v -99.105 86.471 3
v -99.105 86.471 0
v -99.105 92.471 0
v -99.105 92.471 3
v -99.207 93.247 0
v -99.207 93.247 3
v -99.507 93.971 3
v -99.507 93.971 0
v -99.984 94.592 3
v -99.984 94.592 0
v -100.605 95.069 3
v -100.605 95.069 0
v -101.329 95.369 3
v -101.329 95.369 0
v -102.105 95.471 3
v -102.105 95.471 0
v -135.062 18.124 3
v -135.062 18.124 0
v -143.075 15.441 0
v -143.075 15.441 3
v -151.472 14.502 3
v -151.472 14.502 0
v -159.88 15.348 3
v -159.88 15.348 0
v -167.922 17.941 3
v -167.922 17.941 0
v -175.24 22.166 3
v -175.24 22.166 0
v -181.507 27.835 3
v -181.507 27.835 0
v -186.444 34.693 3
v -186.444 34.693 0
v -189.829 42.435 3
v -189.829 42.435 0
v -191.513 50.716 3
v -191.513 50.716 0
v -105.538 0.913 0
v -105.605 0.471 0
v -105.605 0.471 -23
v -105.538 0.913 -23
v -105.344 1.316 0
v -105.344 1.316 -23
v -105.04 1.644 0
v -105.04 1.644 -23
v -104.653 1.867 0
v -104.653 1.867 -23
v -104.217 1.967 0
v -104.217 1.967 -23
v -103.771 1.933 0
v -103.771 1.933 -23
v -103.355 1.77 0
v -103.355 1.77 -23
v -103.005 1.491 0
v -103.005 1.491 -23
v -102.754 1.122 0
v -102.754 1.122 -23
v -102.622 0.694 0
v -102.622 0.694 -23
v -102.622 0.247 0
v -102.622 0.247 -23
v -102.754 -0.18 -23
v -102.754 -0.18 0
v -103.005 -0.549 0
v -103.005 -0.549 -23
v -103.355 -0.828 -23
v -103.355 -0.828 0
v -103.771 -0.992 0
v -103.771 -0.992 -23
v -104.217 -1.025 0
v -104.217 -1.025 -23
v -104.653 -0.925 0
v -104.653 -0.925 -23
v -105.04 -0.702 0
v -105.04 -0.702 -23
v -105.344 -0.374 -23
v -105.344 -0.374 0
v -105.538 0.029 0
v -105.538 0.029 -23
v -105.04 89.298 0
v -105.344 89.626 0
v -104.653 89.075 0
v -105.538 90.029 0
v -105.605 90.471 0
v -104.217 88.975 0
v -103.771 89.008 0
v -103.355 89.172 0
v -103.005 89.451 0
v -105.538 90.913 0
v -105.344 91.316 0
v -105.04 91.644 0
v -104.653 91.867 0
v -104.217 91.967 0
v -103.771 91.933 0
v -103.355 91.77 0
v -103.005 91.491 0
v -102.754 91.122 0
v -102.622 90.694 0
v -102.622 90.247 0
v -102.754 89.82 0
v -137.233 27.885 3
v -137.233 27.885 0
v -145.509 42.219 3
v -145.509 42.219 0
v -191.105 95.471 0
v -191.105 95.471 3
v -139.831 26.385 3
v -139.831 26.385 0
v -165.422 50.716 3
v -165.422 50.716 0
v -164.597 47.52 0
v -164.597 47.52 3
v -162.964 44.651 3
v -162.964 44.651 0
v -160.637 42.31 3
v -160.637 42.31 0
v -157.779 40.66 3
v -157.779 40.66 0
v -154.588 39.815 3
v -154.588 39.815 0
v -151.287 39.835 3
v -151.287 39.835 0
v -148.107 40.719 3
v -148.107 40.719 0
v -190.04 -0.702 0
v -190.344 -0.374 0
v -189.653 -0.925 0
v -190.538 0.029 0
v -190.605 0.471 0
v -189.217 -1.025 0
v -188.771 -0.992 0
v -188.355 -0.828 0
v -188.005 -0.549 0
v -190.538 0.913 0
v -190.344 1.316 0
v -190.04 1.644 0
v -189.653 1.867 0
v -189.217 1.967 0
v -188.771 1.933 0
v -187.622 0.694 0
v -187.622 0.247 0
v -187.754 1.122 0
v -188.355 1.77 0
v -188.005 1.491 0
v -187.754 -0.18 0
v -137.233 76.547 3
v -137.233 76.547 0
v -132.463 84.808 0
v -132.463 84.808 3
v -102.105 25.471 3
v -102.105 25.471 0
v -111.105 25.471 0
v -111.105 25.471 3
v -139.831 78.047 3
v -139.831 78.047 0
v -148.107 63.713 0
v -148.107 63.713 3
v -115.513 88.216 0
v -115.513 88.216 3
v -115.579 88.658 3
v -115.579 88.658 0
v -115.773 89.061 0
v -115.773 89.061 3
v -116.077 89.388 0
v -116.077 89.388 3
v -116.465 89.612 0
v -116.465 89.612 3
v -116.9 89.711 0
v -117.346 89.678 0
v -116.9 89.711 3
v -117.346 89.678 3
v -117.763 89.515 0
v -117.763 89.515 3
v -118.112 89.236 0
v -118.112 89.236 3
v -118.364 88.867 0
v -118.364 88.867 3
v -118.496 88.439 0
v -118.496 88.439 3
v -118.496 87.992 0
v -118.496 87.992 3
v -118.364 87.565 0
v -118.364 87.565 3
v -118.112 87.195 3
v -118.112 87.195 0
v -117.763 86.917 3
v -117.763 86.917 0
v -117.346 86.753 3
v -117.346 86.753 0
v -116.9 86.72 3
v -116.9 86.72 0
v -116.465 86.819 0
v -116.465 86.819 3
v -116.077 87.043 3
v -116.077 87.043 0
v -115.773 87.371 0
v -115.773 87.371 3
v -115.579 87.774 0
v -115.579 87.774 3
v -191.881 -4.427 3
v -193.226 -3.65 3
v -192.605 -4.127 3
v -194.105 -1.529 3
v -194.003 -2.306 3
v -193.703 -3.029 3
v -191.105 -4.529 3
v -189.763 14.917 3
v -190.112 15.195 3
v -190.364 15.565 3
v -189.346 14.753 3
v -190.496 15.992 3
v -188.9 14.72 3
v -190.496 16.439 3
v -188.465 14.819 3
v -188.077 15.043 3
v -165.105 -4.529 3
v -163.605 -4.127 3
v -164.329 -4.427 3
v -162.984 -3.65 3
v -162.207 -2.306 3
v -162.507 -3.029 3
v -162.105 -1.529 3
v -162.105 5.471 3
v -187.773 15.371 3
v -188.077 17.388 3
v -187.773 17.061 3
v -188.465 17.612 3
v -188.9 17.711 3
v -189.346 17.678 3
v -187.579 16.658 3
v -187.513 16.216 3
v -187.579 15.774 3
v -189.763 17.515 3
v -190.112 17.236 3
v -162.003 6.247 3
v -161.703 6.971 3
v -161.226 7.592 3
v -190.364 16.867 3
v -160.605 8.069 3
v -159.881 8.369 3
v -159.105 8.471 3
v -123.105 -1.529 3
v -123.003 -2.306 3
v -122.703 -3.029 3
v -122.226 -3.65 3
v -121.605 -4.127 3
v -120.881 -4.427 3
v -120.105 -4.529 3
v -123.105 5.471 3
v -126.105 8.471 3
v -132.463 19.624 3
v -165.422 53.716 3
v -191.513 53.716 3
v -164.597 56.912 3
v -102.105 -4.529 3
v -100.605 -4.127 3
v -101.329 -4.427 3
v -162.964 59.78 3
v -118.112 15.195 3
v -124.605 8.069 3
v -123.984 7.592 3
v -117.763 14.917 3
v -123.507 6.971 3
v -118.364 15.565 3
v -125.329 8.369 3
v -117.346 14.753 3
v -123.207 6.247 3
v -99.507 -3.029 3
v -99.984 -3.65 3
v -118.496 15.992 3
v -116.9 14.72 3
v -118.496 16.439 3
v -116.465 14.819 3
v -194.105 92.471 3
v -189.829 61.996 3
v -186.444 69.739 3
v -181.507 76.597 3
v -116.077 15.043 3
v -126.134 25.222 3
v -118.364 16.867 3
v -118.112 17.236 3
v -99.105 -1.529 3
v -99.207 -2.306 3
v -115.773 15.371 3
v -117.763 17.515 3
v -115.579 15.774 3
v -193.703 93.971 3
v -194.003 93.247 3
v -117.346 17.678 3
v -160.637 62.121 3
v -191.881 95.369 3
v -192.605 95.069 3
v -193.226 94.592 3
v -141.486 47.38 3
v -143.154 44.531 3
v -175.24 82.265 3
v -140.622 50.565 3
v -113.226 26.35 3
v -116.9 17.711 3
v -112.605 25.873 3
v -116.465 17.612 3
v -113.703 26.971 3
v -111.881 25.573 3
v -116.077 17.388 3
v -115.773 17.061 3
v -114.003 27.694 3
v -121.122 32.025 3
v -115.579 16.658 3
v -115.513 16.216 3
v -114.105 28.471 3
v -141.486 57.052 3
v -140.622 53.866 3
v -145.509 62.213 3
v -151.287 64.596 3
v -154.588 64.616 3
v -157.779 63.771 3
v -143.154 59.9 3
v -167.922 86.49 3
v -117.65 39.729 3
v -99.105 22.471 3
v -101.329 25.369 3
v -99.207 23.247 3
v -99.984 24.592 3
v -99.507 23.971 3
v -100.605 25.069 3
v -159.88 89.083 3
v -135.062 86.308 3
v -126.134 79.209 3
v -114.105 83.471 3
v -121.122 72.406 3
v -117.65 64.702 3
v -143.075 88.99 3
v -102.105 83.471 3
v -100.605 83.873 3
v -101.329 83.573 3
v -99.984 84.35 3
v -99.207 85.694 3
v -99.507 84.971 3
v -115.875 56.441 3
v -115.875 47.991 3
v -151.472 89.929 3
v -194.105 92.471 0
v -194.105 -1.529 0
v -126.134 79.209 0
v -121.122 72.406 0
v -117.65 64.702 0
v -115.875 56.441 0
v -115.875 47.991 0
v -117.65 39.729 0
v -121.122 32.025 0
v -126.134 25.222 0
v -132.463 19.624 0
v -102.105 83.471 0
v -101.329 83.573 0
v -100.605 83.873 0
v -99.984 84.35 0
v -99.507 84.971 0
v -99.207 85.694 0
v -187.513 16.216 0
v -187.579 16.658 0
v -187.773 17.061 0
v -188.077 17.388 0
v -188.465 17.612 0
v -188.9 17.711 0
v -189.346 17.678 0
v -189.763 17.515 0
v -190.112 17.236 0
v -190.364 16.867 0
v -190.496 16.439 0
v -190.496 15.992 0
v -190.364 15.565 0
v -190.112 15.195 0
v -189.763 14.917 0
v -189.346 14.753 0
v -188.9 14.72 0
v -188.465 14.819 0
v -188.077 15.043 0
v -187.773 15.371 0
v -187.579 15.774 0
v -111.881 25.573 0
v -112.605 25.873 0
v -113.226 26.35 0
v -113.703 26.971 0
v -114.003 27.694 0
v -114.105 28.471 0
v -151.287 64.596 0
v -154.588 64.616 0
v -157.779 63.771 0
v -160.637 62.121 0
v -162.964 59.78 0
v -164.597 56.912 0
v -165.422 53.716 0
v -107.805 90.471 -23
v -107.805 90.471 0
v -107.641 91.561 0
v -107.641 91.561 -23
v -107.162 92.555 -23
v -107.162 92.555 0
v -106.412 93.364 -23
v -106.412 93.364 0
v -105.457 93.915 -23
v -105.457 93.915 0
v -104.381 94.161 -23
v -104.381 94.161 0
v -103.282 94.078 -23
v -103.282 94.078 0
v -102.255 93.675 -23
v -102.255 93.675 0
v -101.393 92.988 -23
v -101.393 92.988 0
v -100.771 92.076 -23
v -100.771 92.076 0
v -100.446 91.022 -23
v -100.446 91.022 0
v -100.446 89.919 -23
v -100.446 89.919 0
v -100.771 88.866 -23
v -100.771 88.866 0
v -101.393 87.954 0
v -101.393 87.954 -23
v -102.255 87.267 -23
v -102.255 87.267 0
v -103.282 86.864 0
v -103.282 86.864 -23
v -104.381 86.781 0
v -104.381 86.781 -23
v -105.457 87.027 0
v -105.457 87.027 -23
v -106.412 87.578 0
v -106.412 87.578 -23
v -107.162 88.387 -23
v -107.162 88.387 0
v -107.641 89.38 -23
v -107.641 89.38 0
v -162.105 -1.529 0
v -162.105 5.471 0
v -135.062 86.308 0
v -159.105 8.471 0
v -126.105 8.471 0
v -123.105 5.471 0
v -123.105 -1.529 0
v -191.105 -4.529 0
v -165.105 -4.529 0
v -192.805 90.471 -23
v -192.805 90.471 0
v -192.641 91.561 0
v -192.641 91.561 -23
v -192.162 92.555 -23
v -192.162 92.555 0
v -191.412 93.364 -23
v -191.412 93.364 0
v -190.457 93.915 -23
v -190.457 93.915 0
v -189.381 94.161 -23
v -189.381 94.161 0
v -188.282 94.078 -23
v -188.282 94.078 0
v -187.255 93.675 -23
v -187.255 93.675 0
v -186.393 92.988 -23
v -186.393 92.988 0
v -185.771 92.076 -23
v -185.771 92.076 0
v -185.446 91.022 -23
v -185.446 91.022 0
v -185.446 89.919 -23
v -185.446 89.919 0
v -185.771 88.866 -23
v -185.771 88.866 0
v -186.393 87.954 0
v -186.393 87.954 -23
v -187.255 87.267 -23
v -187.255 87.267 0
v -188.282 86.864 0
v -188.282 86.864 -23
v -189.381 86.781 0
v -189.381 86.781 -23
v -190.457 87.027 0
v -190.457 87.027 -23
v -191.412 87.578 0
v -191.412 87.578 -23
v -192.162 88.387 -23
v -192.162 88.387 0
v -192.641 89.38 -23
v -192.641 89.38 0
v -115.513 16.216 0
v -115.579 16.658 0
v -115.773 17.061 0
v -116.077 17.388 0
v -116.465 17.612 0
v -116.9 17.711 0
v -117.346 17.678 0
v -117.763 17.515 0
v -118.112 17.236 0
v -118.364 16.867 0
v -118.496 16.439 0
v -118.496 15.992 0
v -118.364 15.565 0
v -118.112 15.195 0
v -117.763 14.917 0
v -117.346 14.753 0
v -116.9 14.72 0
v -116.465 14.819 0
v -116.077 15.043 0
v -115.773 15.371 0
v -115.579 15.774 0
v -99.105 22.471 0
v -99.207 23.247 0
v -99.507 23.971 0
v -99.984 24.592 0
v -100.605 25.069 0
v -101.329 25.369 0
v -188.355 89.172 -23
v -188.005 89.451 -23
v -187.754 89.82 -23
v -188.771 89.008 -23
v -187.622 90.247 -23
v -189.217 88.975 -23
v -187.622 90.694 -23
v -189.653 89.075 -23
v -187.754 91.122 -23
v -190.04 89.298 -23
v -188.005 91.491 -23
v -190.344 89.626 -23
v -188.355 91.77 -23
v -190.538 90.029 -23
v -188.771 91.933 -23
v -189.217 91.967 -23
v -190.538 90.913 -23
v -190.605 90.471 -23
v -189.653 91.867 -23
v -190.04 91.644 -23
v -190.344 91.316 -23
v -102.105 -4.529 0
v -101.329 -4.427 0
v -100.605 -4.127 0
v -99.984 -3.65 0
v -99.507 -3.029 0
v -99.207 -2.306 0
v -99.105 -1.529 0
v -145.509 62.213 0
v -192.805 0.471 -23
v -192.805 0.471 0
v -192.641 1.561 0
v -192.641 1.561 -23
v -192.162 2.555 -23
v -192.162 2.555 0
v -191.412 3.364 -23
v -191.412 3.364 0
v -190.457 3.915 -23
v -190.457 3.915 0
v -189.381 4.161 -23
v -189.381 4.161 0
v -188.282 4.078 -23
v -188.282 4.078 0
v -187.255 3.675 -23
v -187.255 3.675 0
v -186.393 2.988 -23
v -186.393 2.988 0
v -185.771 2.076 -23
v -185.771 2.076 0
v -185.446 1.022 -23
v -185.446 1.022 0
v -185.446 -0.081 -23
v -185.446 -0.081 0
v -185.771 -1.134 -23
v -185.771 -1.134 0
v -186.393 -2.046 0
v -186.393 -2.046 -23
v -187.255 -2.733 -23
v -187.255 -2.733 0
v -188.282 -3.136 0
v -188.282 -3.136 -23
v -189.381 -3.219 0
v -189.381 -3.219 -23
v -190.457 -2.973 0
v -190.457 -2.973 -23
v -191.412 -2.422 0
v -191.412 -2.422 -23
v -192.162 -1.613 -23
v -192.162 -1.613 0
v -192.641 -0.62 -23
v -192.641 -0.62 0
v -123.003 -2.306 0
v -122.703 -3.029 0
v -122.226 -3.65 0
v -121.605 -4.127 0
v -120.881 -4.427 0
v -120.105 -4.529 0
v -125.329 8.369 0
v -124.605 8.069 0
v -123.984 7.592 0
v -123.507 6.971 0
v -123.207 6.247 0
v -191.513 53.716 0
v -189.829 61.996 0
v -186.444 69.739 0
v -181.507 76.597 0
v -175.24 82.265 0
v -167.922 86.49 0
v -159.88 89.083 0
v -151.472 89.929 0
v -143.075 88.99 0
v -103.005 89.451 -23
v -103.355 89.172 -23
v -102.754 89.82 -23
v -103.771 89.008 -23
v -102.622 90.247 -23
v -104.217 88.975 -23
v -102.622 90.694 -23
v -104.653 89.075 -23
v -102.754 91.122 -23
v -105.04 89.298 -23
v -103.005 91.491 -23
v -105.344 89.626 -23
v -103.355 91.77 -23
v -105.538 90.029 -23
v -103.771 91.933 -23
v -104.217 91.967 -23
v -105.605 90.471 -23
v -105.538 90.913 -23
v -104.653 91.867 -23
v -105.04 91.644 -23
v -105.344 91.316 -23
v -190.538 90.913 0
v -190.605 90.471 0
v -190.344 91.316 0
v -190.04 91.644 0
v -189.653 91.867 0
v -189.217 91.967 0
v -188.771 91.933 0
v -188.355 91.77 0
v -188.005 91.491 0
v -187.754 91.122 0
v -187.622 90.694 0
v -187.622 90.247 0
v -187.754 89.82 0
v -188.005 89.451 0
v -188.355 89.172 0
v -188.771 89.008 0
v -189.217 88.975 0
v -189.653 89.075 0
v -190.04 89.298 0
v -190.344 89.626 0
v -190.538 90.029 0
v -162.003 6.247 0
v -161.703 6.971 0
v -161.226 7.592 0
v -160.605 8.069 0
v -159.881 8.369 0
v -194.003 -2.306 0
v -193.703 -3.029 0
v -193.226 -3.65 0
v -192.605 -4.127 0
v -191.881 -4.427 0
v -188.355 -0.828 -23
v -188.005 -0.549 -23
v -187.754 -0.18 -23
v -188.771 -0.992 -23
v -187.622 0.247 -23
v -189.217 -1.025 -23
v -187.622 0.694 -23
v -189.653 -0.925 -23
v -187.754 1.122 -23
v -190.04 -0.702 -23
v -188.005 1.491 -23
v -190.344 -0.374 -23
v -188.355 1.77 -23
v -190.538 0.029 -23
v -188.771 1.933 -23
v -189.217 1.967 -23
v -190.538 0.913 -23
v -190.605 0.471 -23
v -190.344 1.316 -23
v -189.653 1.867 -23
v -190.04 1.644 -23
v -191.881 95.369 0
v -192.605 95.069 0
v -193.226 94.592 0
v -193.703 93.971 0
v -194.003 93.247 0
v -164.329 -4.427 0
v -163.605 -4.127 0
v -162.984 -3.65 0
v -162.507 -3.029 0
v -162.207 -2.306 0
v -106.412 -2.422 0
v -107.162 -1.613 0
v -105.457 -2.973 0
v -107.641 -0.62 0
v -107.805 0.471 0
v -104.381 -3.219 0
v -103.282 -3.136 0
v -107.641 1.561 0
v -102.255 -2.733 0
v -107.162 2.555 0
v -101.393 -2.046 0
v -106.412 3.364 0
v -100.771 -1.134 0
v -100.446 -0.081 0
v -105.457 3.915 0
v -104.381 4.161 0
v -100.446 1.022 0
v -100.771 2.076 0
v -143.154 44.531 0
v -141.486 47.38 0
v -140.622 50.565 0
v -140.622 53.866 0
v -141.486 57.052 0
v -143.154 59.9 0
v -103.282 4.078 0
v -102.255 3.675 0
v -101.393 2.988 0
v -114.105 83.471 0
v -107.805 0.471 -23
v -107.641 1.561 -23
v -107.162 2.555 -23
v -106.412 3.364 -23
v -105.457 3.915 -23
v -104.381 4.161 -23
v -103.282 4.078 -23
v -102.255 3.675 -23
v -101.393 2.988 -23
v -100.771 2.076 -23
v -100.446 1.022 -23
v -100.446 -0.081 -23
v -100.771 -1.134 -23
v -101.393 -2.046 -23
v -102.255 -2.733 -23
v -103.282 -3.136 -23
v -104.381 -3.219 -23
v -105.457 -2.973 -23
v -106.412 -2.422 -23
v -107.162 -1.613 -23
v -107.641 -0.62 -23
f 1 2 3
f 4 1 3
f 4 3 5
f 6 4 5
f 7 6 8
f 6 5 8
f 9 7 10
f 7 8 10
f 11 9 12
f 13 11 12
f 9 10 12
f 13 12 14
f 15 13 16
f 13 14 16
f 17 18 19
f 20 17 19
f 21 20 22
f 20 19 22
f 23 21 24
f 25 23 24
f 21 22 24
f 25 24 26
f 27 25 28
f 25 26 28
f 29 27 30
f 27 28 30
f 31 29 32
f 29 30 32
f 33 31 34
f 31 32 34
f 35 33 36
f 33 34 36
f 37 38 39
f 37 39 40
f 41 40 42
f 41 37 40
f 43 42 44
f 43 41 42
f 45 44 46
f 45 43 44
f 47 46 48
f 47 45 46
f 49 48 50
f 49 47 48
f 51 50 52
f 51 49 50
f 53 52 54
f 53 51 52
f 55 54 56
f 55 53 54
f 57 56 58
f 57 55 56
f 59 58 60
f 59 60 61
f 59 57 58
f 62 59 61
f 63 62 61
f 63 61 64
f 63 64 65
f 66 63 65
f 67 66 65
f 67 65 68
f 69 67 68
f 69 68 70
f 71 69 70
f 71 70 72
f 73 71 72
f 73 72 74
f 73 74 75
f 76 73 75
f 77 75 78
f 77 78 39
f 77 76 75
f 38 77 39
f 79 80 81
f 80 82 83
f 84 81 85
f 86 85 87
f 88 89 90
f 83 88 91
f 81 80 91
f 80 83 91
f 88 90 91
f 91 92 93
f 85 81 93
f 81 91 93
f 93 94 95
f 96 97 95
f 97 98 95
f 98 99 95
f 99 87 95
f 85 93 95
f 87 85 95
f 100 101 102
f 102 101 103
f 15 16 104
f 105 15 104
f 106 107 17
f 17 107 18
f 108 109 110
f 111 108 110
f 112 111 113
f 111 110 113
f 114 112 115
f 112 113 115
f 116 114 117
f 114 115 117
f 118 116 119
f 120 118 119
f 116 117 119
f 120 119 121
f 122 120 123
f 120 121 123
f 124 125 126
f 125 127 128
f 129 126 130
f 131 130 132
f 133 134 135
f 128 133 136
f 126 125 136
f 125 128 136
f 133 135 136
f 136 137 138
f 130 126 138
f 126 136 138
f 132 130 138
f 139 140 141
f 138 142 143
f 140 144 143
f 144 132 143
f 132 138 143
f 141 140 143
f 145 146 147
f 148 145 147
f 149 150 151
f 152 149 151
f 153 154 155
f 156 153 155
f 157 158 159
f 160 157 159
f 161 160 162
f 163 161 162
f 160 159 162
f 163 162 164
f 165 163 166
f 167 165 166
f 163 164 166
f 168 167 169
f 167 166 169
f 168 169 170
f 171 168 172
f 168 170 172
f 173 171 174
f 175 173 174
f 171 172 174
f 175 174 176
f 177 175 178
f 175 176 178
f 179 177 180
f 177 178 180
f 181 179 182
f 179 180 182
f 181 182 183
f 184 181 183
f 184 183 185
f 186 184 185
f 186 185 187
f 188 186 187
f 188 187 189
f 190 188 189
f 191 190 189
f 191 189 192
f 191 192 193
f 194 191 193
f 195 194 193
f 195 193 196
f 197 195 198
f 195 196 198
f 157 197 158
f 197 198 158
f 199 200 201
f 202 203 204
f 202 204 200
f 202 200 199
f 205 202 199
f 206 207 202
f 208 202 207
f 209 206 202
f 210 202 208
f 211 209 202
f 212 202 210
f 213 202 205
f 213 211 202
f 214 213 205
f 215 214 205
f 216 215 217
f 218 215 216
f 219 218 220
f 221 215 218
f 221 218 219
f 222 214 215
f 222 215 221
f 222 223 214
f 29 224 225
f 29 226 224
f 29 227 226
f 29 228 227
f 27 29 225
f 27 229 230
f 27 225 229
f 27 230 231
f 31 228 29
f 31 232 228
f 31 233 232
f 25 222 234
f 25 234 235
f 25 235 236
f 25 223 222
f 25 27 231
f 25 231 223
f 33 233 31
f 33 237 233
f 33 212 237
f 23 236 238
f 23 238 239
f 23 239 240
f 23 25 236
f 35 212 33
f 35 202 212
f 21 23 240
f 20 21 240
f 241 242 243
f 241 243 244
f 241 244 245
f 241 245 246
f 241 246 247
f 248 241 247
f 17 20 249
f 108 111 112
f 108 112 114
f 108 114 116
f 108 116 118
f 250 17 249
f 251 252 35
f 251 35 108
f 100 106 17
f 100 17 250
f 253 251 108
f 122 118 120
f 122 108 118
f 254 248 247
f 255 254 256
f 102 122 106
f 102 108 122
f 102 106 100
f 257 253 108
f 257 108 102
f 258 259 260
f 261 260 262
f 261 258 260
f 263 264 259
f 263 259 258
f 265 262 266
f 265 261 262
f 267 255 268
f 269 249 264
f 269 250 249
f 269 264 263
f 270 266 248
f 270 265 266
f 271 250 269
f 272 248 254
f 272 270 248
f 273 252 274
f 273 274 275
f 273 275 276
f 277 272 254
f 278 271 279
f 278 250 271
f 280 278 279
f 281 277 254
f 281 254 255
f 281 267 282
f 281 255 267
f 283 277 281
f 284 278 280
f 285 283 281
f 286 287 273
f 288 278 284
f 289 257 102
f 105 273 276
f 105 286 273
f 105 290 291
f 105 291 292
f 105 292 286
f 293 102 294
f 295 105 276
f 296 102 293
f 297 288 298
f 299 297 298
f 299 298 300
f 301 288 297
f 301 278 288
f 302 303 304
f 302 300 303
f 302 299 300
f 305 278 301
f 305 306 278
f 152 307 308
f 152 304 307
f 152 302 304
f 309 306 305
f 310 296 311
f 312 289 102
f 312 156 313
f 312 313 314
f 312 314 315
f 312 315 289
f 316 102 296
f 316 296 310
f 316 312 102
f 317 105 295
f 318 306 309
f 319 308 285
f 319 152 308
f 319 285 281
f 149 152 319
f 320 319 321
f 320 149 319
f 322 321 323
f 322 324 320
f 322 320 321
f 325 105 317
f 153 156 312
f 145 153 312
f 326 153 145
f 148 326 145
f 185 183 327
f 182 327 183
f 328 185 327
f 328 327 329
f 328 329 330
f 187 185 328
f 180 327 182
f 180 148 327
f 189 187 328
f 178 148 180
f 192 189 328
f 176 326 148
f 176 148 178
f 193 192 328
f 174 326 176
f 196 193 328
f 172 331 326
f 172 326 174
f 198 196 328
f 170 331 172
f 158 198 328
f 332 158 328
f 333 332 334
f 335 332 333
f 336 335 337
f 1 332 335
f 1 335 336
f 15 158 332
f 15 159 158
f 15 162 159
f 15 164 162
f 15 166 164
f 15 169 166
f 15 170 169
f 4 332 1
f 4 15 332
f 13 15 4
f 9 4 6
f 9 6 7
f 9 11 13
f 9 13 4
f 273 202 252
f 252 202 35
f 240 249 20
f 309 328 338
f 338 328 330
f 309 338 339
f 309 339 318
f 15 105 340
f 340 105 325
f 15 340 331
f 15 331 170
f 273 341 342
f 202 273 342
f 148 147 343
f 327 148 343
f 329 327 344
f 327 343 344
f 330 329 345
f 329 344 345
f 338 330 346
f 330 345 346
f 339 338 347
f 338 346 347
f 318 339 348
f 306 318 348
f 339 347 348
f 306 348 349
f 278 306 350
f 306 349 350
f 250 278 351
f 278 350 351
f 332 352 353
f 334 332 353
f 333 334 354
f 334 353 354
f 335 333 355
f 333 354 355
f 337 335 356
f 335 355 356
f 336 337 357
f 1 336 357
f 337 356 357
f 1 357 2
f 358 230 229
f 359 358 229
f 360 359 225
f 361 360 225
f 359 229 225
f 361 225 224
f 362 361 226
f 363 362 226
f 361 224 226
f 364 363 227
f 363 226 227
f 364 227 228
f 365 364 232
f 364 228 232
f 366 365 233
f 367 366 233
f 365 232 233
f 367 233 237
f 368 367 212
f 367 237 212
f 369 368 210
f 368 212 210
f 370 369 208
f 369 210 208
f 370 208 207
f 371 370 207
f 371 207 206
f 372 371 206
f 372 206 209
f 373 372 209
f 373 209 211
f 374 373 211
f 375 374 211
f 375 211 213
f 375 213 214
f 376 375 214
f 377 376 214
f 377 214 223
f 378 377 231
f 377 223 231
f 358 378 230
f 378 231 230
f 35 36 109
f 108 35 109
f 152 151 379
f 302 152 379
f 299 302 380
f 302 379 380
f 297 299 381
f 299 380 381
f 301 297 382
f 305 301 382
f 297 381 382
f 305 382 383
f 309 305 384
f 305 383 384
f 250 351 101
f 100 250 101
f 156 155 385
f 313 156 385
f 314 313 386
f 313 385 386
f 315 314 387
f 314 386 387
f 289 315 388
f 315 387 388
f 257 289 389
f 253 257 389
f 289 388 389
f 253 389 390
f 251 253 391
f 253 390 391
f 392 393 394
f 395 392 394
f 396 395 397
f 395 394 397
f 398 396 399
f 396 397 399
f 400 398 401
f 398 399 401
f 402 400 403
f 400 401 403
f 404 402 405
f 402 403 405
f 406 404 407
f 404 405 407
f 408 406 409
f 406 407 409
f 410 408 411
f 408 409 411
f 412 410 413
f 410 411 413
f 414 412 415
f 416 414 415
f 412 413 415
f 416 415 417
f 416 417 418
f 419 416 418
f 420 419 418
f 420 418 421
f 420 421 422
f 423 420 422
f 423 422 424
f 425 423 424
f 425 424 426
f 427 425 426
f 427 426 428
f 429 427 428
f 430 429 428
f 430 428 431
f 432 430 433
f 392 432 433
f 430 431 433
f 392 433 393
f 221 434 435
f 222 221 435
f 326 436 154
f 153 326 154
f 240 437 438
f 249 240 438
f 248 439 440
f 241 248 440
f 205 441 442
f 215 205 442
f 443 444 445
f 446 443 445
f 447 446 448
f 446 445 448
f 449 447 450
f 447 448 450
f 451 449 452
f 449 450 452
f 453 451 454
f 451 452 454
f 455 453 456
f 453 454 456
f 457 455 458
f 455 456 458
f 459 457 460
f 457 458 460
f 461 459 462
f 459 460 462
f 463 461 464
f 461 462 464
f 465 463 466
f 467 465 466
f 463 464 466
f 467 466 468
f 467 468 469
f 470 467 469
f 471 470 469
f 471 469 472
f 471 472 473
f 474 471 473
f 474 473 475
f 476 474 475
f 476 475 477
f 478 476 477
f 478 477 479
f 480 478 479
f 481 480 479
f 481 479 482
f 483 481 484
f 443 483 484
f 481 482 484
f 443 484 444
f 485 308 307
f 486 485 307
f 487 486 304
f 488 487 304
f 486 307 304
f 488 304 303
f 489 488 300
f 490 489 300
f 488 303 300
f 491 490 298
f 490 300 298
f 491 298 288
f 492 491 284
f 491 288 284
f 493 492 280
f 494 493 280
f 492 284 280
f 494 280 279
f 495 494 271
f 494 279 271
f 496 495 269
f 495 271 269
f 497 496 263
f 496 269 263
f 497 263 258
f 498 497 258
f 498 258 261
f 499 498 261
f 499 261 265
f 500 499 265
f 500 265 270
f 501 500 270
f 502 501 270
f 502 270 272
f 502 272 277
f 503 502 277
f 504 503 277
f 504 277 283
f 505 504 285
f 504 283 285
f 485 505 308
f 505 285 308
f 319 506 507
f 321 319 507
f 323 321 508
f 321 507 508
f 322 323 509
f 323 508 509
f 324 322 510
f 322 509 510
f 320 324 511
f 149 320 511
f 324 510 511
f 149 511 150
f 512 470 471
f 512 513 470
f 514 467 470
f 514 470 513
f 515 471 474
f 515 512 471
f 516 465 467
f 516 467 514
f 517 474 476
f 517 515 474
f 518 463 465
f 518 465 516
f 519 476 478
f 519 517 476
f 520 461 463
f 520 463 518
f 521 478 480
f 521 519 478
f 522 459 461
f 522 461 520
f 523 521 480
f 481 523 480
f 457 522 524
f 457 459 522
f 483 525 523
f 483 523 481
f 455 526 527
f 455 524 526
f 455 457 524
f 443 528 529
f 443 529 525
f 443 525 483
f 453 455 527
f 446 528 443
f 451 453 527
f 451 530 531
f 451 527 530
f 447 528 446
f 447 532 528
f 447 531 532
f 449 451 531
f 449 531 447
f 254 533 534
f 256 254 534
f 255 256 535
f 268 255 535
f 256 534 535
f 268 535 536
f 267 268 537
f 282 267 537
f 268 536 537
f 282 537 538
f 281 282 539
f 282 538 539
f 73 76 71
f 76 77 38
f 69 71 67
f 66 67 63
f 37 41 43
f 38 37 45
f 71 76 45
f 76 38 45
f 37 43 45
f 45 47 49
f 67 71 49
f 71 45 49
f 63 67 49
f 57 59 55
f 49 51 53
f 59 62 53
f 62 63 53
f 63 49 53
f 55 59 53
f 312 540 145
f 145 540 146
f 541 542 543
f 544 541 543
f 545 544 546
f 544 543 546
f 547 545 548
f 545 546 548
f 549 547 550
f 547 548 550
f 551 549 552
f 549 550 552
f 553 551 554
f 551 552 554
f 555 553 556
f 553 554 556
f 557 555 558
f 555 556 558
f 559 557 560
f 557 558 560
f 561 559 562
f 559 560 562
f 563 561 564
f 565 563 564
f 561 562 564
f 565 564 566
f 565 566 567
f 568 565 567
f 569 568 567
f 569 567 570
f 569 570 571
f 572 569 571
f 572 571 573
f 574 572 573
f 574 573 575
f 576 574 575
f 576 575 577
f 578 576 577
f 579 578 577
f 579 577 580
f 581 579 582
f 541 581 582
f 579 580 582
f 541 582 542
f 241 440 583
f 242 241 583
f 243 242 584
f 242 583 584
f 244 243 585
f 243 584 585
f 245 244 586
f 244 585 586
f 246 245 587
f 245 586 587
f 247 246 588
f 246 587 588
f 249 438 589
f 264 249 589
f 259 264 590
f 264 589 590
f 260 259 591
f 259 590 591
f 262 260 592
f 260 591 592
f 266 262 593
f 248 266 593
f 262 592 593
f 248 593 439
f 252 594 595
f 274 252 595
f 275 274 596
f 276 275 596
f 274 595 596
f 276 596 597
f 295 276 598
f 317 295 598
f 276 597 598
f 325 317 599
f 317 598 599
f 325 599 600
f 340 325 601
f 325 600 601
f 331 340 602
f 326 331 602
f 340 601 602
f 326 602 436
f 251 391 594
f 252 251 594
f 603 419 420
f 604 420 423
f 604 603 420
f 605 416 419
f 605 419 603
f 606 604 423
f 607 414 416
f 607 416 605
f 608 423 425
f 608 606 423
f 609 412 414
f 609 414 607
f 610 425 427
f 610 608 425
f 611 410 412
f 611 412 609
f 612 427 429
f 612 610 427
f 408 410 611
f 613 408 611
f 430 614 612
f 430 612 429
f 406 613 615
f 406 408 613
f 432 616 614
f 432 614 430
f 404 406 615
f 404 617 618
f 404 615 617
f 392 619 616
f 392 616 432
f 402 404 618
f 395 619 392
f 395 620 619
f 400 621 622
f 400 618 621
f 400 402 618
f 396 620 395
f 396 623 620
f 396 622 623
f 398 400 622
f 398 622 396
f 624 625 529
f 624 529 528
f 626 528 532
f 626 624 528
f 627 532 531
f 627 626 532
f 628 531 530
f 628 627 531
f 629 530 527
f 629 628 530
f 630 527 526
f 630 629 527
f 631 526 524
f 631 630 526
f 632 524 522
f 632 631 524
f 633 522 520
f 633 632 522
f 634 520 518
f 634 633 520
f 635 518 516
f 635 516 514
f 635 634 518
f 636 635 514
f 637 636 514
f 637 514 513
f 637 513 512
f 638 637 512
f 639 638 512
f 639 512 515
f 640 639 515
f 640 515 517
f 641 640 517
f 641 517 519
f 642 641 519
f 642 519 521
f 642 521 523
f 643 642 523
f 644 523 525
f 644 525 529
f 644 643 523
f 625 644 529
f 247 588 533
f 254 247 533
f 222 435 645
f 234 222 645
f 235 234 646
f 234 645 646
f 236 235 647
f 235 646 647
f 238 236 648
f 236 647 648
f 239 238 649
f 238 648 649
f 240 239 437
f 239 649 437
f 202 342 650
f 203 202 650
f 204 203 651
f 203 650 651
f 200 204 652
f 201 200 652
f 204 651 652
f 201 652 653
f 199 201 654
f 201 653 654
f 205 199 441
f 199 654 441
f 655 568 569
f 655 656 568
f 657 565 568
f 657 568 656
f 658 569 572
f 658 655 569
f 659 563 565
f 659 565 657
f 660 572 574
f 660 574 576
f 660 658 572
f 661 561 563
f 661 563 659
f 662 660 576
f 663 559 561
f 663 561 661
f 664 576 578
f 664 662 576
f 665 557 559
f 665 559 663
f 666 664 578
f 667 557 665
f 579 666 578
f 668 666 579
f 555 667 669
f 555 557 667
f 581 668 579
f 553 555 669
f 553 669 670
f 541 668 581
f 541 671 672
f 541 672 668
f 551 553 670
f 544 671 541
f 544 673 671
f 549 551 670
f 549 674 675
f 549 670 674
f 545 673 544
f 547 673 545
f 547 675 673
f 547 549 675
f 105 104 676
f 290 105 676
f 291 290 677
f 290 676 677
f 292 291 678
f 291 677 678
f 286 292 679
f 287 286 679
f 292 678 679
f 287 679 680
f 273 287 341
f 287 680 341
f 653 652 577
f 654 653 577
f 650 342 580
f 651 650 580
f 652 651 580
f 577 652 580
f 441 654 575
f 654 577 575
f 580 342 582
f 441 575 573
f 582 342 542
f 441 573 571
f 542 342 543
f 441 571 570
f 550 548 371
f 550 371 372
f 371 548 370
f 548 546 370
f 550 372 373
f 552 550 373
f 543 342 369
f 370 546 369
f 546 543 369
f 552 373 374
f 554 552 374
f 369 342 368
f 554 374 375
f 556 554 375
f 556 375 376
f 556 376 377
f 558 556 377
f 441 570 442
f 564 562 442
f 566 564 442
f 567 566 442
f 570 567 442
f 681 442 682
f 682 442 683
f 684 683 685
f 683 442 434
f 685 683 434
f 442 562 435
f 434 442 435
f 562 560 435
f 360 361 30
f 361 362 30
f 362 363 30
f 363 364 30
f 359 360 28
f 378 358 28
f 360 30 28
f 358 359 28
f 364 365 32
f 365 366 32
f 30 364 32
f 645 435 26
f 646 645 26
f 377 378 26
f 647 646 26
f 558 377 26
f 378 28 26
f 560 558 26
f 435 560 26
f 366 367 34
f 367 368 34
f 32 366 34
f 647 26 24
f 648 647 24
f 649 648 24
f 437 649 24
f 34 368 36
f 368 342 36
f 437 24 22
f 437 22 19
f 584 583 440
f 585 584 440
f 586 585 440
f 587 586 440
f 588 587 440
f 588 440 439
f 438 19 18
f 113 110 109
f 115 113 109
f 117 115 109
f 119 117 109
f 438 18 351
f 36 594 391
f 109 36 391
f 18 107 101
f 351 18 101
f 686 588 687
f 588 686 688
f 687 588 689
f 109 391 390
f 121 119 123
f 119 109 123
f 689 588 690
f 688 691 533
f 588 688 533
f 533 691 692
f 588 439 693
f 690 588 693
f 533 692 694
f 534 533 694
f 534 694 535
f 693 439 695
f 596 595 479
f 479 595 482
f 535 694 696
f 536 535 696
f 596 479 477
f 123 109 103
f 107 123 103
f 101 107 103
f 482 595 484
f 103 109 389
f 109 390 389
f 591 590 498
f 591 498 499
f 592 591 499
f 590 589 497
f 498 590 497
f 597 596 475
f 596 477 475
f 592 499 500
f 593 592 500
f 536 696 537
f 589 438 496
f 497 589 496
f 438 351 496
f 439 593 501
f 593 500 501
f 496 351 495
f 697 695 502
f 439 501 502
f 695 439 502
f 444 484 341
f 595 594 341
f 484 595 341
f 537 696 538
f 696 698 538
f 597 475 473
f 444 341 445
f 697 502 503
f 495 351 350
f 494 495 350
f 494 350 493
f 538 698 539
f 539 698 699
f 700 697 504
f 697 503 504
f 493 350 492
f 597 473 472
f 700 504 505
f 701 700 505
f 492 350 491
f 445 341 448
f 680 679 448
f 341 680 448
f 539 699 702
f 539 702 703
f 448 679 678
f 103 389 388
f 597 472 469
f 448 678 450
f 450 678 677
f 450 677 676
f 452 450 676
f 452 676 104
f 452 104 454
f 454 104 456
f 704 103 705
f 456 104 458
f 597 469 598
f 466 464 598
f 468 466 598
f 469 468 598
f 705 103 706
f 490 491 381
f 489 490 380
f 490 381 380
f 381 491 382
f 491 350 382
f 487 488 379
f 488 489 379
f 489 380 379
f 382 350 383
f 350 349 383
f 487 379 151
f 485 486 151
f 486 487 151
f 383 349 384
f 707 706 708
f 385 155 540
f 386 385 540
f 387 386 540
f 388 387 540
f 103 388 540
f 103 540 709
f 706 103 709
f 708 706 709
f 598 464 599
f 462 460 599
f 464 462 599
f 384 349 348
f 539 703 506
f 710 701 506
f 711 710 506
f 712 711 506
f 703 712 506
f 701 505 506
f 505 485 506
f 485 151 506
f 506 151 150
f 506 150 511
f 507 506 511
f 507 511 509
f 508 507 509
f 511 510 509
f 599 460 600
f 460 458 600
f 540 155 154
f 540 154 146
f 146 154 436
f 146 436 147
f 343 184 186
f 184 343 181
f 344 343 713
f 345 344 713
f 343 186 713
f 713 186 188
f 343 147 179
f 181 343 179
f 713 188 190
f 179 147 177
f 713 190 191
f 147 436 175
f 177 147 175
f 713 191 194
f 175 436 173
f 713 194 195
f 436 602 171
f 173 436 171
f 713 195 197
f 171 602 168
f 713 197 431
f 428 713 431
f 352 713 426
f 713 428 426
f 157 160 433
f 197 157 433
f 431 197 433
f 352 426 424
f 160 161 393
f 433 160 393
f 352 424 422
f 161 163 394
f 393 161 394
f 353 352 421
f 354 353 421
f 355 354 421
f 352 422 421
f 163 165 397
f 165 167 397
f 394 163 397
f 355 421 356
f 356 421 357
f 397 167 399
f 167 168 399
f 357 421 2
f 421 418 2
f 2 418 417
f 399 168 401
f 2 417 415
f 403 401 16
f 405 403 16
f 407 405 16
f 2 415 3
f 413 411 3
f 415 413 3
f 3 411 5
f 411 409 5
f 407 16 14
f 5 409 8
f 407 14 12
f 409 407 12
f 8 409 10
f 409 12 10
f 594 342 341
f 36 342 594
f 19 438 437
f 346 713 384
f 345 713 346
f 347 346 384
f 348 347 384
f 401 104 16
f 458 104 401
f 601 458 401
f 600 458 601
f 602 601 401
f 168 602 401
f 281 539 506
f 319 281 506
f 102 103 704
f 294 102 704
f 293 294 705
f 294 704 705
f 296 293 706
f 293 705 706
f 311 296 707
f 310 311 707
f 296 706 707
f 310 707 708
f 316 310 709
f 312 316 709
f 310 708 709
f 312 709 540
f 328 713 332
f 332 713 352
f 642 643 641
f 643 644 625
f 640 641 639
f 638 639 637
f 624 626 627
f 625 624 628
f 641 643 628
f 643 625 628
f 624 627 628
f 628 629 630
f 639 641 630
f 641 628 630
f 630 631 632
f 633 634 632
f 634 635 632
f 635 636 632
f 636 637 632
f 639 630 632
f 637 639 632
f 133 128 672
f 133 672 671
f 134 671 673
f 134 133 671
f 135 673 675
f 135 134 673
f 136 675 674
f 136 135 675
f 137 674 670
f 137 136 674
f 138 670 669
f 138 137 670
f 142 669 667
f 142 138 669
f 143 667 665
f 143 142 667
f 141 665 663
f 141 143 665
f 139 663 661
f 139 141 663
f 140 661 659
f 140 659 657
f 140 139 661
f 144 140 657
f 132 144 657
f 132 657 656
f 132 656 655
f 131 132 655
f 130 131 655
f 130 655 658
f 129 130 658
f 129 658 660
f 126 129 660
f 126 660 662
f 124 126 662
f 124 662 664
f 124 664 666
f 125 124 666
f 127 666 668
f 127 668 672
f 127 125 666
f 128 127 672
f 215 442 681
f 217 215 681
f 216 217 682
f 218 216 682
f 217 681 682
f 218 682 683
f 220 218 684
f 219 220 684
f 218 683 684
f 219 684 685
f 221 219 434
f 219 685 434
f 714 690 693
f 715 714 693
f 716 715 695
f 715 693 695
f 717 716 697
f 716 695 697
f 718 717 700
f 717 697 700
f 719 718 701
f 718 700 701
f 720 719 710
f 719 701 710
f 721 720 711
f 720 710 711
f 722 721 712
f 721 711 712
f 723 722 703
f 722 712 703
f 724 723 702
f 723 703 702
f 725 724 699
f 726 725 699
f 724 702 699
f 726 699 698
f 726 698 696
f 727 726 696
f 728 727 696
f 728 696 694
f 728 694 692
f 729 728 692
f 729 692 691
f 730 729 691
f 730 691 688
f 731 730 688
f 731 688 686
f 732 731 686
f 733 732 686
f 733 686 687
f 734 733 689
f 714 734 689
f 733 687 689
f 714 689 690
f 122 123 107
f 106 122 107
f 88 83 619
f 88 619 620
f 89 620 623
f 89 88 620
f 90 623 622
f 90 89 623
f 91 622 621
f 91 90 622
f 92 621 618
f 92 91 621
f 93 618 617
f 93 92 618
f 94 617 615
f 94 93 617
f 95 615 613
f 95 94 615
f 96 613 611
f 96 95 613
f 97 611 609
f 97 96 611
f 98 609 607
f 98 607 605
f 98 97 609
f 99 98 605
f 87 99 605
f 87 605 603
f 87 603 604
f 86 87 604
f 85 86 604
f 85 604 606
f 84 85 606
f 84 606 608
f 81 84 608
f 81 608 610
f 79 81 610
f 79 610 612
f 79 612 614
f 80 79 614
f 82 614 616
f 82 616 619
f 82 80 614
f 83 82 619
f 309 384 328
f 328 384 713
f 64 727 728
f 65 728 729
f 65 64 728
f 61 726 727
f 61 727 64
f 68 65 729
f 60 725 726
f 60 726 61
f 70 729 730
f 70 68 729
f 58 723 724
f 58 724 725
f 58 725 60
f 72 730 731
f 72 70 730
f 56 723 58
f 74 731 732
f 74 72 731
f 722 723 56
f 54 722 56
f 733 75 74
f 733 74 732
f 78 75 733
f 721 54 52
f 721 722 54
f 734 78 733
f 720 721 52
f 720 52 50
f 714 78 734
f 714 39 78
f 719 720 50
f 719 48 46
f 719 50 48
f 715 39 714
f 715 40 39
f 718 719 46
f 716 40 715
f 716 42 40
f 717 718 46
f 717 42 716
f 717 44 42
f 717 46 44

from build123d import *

# Parameters (mm, degrees)
SALIENTE_EXTRUIR1_DEPTH = 3
CROQUIS2_R              = 3.7
CROQUIS2_R_2            = 1.5
SALIENTE_EXTRUIR2_DEPTH = 23
CROQUIS3_R              = 1.5
CORTAR_EXTRUIR1_DEPTH   = 3


with BuildPart() as part:
    # Croquis1 → Saliente-Extruir1 (new body)
    with BuildSketch(Plane.XY):
        with BuildLine():
            Line((-194.10496046, 92.470884256), (-194.10496046, 88.470884256))
            Line((-194.10496046, 88.470884256), (-194.10496046, 5.382772077))
            Line((-194.10496046, 5.382772077), (-194.10496046, -1.529115744))
            ThreePointArc((-194.10496046, -1.529115744), (-193.226280804, -3.650436088), (-191.10496046, -4.529115744))
            Line((-191.10496046, -4.529115744), (-165.10496046, -4.529115744))
            ThreePointArc((-165.10496046, -4.529115744), (-162.983640117, -3.650436088), (-162.10496046, -1.529115744))
            Line((-162.10496046, -1.529115744), (-162.10496046, 5.470884256))
            ThreePointArc((-162.10496046, 5.470884256), (-161.226280804, 7.592204599), (-159.10496046, 8.470884256))
            Line((-159.10496046, 8.470884256), (-126.10496046, 8.470884256))
            ThreePointArc((-126.10496046, 8.470884256), (-123.983640117, 7.592204599), (-123.10496046, 5.470884256))
            Line((-123.10496046, 5.470884256), (-123.10496046, -1.529115744))
            ThreePointArc((-123.10496046, -1.529115744), (-122.226280804, -3.650436088), (-120.10496046, -4.529115744))
            Line((-120.10496046, -4.529115744), (-102.10496046, -4.529115744))
            ThreePointArc((-102.10496046, -4.529115744), (-99.983640117, -3.650436088), (-99.10496046, -1.529115744))
            Line((-99.10496046, -1.529115744), (-99.10496046, 22.470884256))
            ThreePointArc((-99.10496046, 22.470884256), (-99.983640117, 24.592204599), (-102.10496046, 25.470884256))
            Line((-102.10496046, 25.470884256), (-111.10496046, 25.470884256))
            ThreePointArc((-111.10496046, 25.470884256), (-113.226280804, 26.349563912), (-114.10496046, 28.470884256))
            Line((-114.10496046, 28.470884256), (-114.10496046, 60.470884256))
            Line((-114.10496046, 60.470884256), (-114.10496046, 83.470884256))
            Line((-114.10496046, 83.470884256), (-102.10496046, 83.470884256))
            ThreePointArc((-102.10496046, 83.470884256), (-99.983640117, 84.349563912), (-99.10496046, 86.470884256))
            Line((-99.10496046, 86.470884256), (-99.10496046, 92.470884256))
            ThreePointArc((-99.10496046, 92.470884256), (-99.983640117, 94.592204599), (-102.10496046, 95.470884256))
            Line((-102.10496046, 95.470884256), (-191.10496046, 95.470884256))
            ThreePointArc((-191.10496046, 95.470884256), (-193.226280804, 94.592204599), (-194.10496046, 92.470884256))
        make_face()
        with BuildLine():
            Line((-181.973694619, 53.715677144), (-191.512513703, 53.715677144))
            ThreePointArc((-191.512513703, 53.715677144), (-171.693012047, 84.571249386), (-135.061551809, 86.307655189))
            Line((-135.061551809, 86.307655189), (-139.830961352, 78.04679554))
            Line((-139.830961352, 78.04679554), (-148.106714986, 63.712769774))
            ThreePointArc((-148.106714986, 63.712769774), (-159.262513703, 63.040994691), (-165.422187349, 53.715677144))
            Line((-165.422187349, 53.715677144), (-181.973694619, 53.715677144))
        make_face(mode=Mode.SUBTRACT)
        with BuildLine():
            Line((-145.508638775, 62.212769774), (-137.23288514, 76.54679554))
            Line((-137.23288514, 76.54679554), (-132.463475598, 84.807655189))
            ThreePointArc((-132.463475598, 84.807655189), (-115.651517015, 52.215677144), (-132.463475598, 19.623699098))
            Line((-132.463475598, 19.623699098), (-137.23288514, 27.884558748))
            Line((-137.23288514, 27.884558748), (-145.508638775, 42.218584514))
            ThreePointArc((-145.508638775, 42.218584514), (-140.512513703, 52.215677144), (-145.508638775, 62.212769774))
        make_face(mode=Mode.SUBTRACT)
        with BuildLine():
            Line((-148.106714986, 40.718584514), (-139.830961352, 26.384558748))
            Line((-139.830961352, 26.384558748), (-135.061551809, 18.123699098))
            ThreePointArc((-135.061551809, 18.123699098), (-171.693012047, 19.860104901), (-191.512513703, 50.715677144))
            Line((-191.512513703, 50.715677144), (-181.973694619, 50.715677144))
            Line((-181.973694619, 50.715677144), (-165.422187349, 50.715677144))
            ThreePointArc((-165.422187349, 50.715677144), (-159.262513703, 41.390359596), (-148.106714986, 40.718584514))
        make_face(mode=Mode.SUBTRACT)
    extrude(amount=SALIENTE_EXTRUIR1_DEPTH)

    # Croquis2 → Saliente-Extruir2 (add)
    with BuildSketch(Plane(origin=(0, 0, 0), x_dir=(-1, 0, 0), z_dir=(0, 0, -1))):
        with Locations((189.10496046, 90.470884256)):
            Circle(CROQUIS2_R)
        with Locations((189.10496046, 90.470884256)):
            Circle(CROQUIS2_R_2, mode=Mode.SUBTRACT)
        with Locations((104.10496046, 90.470884256)):
            Circle(CROQUIS2_R)
        with Locations((104.10496046, 90.470884256)):
            Circle(CROQUIS2_R_2, mode=Mode.SUBTRACT)
        with Locations((104.10496046, 0.470884256)):
            Circle(CROQUIS2_R)
        with Locations((104.10496046, 0.470884256)):
            Circle(CROQUIS2_R_2, mode=Mode.SUBTRACT)
        with Locations((189.10496046, 0.470884256)):
            Circle(CROQUIS2_R)
        with Locations((189.10496046, 0.470884256)):
            Circle(CROQUIS2_R_2, mode=Mode.SUBTRACT)
    extrude(amount=SALIENTE_EXTRUIR2_DEPTH)

    # Croquis3 → Cortar-Extruir1 (cut)
    with BuildSketch(Plane.XY.offset(3)):
        with Locations((-117.012513703, 16.215677144)):
            Circle(CROQUIS3_R)
        with Locations((-189.012513703, 16.215677144)):
            Circle(CROQUIS3_R)
        with Locations((-117.012513703, 88.215677144)):
            Circle(CROQUIS3_R)
    extrude(amount=-CORTAR_EXTRUIR1_DEPTH, mode=Mode.SUBTRACT)


solid = part.part
